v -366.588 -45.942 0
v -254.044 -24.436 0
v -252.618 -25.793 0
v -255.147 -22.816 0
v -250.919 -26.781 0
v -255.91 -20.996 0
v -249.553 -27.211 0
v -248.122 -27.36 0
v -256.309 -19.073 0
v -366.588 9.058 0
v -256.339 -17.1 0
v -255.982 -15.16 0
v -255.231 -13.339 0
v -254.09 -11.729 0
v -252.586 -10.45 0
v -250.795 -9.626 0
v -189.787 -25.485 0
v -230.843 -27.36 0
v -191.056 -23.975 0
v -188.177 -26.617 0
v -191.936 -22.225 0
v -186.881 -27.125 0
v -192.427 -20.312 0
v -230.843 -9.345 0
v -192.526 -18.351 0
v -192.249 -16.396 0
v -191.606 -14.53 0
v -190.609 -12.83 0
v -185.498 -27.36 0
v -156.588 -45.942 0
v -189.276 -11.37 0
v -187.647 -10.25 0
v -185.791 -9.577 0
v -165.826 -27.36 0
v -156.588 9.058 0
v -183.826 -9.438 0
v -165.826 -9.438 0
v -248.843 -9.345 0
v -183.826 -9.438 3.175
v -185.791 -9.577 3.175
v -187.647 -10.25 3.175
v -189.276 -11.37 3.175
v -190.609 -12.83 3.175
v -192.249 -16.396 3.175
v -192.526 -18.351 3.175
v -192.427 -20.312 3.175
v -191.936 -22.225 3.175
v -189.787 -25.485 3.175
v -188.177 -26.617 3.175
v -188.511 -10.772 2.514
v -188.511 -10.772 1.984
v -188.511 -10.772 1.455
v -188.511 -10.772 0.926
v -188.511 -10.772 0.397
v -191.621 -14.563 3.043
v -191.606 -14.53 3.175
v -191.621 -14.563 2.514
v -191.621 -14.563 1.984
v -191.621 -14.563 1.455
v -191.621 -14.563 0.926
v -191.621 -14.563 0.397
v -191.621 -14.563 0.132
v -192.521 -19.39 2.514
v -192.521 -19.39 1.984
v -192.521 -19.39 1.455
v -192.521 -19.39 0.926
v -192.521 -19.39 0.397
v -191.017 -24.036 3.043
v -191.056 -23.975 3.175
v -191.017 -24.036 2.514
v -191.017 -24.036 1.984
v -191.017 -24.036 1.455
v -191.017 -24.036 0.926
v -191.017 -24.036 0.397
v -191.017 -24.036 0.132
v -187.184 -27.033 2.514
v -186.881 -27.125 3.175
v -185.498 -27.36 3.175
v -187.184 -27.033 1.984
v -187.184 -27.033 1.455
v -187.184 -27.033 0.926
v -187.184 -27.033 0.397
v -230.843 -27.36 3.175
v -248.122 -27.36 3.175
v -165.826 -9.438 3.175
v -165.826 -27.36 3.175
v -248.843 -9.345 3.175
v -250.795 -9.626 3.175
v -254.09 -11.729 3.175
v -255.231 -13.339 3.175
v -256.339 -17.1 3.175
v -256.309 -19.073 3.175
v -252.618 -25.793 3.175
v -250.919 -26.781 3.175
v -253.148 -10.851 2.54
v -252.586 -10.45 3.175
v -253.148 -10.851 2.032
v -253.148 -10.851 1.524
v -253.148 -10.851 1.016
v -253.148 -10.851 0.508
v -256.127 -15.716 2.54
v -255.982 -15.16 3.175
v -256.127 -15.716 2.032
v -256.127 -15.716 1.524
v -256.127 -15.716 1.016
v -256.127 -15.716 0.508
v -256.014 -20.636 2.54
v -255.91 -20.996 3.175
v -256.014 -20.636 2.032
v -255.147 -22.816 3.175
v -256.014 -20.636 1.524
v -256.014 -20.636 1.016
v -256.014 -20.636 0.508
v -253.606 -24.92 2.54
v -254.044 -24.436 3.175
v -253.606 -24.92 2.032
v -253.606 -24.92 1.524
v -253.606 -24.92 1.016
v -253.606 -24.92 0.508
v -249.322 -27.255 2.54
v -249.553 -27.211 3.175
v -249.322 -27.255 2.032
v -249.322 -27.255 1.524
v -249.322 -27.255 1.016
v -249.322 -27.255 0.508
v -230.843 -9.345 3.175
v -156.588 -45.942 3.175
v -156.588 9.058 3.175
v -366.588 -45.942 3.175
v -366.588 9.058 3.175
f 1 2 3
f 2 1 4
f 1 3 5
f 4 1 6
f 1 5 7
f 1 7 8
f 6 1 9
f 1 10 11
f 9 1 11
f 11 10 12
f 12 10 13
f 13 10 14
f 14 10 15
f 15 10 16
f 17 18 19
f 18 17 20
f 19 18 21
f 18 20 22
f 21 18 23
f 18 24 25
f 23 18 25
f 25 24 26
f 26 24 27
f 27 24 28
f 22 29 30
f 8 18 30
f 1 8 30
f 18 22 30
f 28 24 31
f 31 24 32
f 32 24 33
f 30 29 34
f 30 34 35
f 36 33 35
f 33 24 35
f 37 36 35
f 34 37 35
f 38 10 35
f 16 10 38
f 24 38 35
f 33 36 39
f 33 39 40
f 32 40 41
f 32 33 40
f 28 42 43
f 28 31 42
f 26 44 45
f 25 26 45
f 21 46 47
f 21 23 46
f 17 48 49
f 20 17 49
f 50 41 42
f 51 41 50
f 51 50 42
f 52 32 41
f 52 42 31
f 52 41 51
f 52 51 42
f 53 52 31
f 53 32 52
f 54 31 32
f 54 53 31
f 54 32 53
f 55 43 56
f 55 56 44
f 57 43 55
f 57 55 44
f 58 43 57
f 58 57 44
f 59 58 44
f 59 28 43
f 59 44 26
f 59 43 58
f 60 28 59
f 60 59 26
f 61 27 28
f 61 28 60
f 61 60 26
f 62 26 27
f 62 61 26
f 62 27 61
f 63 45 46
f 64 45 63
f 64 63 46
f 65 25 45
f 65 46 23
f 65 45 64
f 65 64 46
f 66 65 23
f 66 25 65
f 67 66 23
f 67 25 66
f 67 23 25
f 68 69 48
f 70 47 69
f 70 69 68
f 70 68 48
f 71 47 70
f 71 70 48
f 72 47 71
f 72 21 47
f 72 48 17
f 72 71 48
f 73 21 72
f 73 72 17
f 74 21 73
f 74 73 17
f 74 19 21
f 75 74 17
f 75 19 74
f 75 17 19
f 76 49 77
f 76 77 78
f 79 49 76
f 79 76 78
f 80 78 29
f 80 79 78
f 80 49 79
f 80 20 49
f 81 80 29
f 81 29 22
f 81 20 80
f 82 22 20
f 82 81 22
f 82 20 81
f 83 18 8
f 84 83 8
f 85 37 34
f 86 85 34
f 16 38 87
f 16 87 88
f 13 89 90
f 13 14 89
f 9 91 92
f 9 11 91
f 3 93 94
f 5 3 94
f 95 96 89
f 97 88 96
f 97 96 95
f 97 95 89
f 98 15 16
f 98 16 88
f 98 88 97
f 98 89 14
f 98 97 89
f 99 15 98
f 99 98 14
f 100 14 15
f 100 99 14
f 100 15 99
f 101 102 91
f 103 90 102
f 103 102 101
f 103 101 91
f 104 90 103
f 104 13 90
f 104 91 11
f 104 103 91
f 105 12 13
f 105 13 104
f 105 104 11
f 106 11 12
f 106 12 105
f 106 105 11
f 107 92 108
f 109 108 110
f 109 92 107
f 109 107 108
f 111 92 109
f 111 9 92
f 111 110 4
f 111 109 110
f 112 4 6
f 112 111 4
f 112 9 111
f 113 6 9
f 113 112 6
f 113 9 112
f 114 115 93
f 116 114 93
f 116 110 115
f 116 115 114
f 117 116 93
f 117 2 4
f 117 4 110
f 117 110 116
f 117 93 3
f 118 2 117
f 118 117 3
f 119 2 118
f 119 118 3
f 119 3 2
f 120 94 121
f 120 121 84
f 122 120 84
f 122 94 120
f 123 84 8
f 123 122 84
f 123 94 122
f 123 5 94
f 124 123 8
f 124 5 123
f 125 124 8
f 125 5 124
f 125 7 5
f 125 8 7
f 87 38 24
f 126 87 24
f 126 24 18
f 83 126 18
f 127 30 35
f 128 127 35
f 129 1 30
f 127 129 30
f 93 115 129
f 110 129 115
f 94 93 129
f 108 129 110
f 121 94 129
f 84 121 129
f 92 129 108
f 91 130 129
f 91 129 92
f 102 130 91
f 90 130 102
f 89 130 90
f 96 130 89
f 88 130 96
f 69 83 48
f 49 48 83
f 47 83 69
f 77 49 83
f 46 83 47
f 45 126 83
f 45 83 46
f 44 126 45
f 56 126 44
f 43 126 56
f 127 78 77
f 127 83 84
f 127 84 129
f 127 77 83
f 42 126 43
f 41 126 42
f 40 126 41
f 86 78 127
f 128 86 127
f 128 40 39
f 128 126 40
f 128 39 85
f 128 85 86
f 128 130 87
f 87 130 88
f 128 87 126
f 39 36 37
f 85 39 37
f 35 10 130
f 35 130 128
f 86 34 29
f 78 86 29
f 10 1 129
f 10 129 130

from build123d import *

# Parameters (mm, degrees)
SKETCH1_W           = 210
SKETCH1_H           = 55
BOSS_EXTRUDE1_DEPTH = 3.175


with BuildPart() as part:
    # Sketch1 → Boss-Extrude1 (new body)
    with BuildSketch(Plane.XY):
        with Locations((-261.58829827, -18.441689147)):
            Rectangle(SKETCH1_W, SKETCH1_H)
        with BuildLine():
            Line((-183.826005128, -9.437626279), (-165.825906922, -9.437626279))
            Line((-165.825906922, -9.437626279), (-165.825906922, -27.359682536))
            Line((-165.825906922, -27.359682536), (-185.498112528, -27.359682536))
            add(Edge.make_bspline(
                [(-183.826005128, -9.437626279), (-184.381626607, -9.397687719), (-184.930515996, -9.424835034), (-186.015461991, -9.607009465), (-186.554689235, -9.764877403), (-187.316224975, -10.082704779), (-187.563814734, -10.202332624), (-188.04695947, -10.467917292), (-188.283591247, -10.614653216), (-188.967244505, -11.088099477), (-189.385834671, -11.445153232), (-190.155876141, -12.234064044), (-190.507940946, -12.668506087), (-191.124349263, -13.579620928), (-191.392257861, -14.05945224), (-191.73522916, -14.814675279), (-191.839717206, -15.072804389), (-192.025673908, -15.592230911), (-192.107659089, -15.854561779), (-192.321609275, -16.649175241), (-192.421750284, -17.189035513), (-192.508320777, -18.013979615), (-192.526449679, -18.291627862), (-192.540341709, -18.842430921), (-192.536260587, -19.116785649), (-192.490788714, -19.936695463), (-192.416446167, -20.47912245), (-192.234051872, -21.286034277), (-192.160881012, -21.555192562), (-191.992478644, -22.081128913), (-191.89721521, -22.338632762), (-191.57815234, -23.094708941), (-191.321465438, -23.577036127), (-190.86409563, -24.264793996), (-190.698255397, -24.489466796), (-190.347004112, -24.917221829), (-190.161879434, -25.120329067), (-189.577727686, -25.697021795), (-189.150303695, -26.038410046), (-188.444997142, -26.47773401), (-188.199013121, -26.611592551), (-187.699838217, -26.845624837), (-187.189859794, -27.048393537), (-186.658261328, -27.188597437), (-186.115554078, -27.296654363), (-185.837627103, -27.33444368), (-185.540644376, -27.356776903), (-185.519377345, -27.358278606), (-185.498112528, -27.359682536)],
                knots=[0, 0, 0, 0, 0.03125, 0.03125, 0.0625, 0.0625, 0.078125, 0.078125, 0.09375, 0.09375, 0.125, 0.125, 0.15625, 0.15625, 0.1875, 0.1875, 0.203125, 0.203125, 0.21875, 0.21875, 0.25, 0.25, 0.265625, 0.265625, 0.28125, 0.28125, 0.3125, 0.3125, 0.328125, 0.328125, 0.34375, 0.34375, 0.375, 0.375, 0.390625, 0.390625, 0.40625, 0.40625, 0.4375, 0.4375, 0.453125, 0.453125, 0.46875, 0.484375, 0.484375, 0.5, 0.5, 0.501205353, 0.501205353, 0.501205353, 0.501205353], degree=3))
        make_face(mode=Mode.SUBTRACT)
        with BuildLine():
            Line((-248.842639606, -9.34526812), (-230.842639606, -9.34526812))
            Line((-230.842639606, -9.34526812), (-230.842639606, -27.359569421))
            Line((-230.842639606, -27.359569421), (-248.122030426, -27.359569421))
            add(Edge.make_bspline(
                [(-248.842639606, -9.34526812), (-249.008492971, -9.34526812), (-249.174528912, -9.351217217), (-249.897892737, -9.403148293), (-250.439041218, -9.508791349), (-251.226902991, -9.764277117), (-251.486942339, -9.866389631), (-251.991898718, -10.100883467), (-252.478538383, -10.363667412), (-252.930635604, -10.679802053), (-253.365916766, -11.021909044), (-253.576181816, -11.207074635), (-254.170571266, -11.790206392), (-254.521054547, -12.216408682), (-254.984007031, -12.907063712), (-255.128207339, -13.146926319), (-255.391039985, -13.635131957), (-255.510280092, -13.884200022), (-255.833281599, -14.645561933), (-256.003111783, -15.174210606), (-256.250113173, -16.258400348), (-256.325565617, -16.804580713), (-256.371925399, -17.6295328), (-256.376170681, -17.905469832), (-256.362395823, -18.459237102), (-256.344221579, -18.737973637), (-256.257616038, -19.564249546), (-256.157308421, -20.105224546), (-255.942745346, -20.901816623), (-255.860495563, -21.164858437), (-255.673862588, -21.685807516), (-255.568906935, -21.944849427), (-255.224992289, -22.701497667), (-254.956918189, -23.181017599), (-254.49602176, -23.862551099), (-254.33253309, -24.083399995), (-253.984921716, -24.511848542), (-253.79988931, -24.720372449), (-253.217915831, -25.317918038), (-252.799712482, -25.674443478), (-252.12529242, -26.144005131), (-251.892576917, -26.289576641), (-251.410235402, -26.557308591), (-251.158897378, -26.680166876), (-250.389777098, -27.004646057), (-249.862976161, -27.161019247), (-249.050989853, -27.302657737), (-248.776672466, -27.334279323), (-248.37319776, -27.356189189), (-248.247527215, -27.359569421), (-248.122030426, -27.359569421)],
                knots=[0.990687447, 0.990687447, 0.990687447, 0.990687447, 1, 1, 1.03125, 1.03125, 1.046875, 1.046875, 1.0625, 1.078125, 1.078125, 1.09375, 1.09375, 1.125, 1.125, 1.140625, 1.140625, 1.15625, 1.15625, 1.1875, 1.1875, 1.21875, 1.21875, 1.234375, 1.234375, 1.25, 1.25, 1.28125, 1.28125, 1.296875, 1.296875, 1.3125, 1.3125, 1.34375, 1.34375, 1.359375, 1.359375, 1.375, 1.375, 1.40625, 1.40625, 1.421875, 1.421875, 1.4375, 1.4375, 1.46875, 1.46875, 1.484375, 1.484375, 1.491411882, 1.491411882, 1.491411882, 1.491411882], degree=3))
        make_face(mode=Mode.SUBTRACT)
    extrude(amount=BOSS_EXTRUDE1_DEPTH)


solid = part.part
